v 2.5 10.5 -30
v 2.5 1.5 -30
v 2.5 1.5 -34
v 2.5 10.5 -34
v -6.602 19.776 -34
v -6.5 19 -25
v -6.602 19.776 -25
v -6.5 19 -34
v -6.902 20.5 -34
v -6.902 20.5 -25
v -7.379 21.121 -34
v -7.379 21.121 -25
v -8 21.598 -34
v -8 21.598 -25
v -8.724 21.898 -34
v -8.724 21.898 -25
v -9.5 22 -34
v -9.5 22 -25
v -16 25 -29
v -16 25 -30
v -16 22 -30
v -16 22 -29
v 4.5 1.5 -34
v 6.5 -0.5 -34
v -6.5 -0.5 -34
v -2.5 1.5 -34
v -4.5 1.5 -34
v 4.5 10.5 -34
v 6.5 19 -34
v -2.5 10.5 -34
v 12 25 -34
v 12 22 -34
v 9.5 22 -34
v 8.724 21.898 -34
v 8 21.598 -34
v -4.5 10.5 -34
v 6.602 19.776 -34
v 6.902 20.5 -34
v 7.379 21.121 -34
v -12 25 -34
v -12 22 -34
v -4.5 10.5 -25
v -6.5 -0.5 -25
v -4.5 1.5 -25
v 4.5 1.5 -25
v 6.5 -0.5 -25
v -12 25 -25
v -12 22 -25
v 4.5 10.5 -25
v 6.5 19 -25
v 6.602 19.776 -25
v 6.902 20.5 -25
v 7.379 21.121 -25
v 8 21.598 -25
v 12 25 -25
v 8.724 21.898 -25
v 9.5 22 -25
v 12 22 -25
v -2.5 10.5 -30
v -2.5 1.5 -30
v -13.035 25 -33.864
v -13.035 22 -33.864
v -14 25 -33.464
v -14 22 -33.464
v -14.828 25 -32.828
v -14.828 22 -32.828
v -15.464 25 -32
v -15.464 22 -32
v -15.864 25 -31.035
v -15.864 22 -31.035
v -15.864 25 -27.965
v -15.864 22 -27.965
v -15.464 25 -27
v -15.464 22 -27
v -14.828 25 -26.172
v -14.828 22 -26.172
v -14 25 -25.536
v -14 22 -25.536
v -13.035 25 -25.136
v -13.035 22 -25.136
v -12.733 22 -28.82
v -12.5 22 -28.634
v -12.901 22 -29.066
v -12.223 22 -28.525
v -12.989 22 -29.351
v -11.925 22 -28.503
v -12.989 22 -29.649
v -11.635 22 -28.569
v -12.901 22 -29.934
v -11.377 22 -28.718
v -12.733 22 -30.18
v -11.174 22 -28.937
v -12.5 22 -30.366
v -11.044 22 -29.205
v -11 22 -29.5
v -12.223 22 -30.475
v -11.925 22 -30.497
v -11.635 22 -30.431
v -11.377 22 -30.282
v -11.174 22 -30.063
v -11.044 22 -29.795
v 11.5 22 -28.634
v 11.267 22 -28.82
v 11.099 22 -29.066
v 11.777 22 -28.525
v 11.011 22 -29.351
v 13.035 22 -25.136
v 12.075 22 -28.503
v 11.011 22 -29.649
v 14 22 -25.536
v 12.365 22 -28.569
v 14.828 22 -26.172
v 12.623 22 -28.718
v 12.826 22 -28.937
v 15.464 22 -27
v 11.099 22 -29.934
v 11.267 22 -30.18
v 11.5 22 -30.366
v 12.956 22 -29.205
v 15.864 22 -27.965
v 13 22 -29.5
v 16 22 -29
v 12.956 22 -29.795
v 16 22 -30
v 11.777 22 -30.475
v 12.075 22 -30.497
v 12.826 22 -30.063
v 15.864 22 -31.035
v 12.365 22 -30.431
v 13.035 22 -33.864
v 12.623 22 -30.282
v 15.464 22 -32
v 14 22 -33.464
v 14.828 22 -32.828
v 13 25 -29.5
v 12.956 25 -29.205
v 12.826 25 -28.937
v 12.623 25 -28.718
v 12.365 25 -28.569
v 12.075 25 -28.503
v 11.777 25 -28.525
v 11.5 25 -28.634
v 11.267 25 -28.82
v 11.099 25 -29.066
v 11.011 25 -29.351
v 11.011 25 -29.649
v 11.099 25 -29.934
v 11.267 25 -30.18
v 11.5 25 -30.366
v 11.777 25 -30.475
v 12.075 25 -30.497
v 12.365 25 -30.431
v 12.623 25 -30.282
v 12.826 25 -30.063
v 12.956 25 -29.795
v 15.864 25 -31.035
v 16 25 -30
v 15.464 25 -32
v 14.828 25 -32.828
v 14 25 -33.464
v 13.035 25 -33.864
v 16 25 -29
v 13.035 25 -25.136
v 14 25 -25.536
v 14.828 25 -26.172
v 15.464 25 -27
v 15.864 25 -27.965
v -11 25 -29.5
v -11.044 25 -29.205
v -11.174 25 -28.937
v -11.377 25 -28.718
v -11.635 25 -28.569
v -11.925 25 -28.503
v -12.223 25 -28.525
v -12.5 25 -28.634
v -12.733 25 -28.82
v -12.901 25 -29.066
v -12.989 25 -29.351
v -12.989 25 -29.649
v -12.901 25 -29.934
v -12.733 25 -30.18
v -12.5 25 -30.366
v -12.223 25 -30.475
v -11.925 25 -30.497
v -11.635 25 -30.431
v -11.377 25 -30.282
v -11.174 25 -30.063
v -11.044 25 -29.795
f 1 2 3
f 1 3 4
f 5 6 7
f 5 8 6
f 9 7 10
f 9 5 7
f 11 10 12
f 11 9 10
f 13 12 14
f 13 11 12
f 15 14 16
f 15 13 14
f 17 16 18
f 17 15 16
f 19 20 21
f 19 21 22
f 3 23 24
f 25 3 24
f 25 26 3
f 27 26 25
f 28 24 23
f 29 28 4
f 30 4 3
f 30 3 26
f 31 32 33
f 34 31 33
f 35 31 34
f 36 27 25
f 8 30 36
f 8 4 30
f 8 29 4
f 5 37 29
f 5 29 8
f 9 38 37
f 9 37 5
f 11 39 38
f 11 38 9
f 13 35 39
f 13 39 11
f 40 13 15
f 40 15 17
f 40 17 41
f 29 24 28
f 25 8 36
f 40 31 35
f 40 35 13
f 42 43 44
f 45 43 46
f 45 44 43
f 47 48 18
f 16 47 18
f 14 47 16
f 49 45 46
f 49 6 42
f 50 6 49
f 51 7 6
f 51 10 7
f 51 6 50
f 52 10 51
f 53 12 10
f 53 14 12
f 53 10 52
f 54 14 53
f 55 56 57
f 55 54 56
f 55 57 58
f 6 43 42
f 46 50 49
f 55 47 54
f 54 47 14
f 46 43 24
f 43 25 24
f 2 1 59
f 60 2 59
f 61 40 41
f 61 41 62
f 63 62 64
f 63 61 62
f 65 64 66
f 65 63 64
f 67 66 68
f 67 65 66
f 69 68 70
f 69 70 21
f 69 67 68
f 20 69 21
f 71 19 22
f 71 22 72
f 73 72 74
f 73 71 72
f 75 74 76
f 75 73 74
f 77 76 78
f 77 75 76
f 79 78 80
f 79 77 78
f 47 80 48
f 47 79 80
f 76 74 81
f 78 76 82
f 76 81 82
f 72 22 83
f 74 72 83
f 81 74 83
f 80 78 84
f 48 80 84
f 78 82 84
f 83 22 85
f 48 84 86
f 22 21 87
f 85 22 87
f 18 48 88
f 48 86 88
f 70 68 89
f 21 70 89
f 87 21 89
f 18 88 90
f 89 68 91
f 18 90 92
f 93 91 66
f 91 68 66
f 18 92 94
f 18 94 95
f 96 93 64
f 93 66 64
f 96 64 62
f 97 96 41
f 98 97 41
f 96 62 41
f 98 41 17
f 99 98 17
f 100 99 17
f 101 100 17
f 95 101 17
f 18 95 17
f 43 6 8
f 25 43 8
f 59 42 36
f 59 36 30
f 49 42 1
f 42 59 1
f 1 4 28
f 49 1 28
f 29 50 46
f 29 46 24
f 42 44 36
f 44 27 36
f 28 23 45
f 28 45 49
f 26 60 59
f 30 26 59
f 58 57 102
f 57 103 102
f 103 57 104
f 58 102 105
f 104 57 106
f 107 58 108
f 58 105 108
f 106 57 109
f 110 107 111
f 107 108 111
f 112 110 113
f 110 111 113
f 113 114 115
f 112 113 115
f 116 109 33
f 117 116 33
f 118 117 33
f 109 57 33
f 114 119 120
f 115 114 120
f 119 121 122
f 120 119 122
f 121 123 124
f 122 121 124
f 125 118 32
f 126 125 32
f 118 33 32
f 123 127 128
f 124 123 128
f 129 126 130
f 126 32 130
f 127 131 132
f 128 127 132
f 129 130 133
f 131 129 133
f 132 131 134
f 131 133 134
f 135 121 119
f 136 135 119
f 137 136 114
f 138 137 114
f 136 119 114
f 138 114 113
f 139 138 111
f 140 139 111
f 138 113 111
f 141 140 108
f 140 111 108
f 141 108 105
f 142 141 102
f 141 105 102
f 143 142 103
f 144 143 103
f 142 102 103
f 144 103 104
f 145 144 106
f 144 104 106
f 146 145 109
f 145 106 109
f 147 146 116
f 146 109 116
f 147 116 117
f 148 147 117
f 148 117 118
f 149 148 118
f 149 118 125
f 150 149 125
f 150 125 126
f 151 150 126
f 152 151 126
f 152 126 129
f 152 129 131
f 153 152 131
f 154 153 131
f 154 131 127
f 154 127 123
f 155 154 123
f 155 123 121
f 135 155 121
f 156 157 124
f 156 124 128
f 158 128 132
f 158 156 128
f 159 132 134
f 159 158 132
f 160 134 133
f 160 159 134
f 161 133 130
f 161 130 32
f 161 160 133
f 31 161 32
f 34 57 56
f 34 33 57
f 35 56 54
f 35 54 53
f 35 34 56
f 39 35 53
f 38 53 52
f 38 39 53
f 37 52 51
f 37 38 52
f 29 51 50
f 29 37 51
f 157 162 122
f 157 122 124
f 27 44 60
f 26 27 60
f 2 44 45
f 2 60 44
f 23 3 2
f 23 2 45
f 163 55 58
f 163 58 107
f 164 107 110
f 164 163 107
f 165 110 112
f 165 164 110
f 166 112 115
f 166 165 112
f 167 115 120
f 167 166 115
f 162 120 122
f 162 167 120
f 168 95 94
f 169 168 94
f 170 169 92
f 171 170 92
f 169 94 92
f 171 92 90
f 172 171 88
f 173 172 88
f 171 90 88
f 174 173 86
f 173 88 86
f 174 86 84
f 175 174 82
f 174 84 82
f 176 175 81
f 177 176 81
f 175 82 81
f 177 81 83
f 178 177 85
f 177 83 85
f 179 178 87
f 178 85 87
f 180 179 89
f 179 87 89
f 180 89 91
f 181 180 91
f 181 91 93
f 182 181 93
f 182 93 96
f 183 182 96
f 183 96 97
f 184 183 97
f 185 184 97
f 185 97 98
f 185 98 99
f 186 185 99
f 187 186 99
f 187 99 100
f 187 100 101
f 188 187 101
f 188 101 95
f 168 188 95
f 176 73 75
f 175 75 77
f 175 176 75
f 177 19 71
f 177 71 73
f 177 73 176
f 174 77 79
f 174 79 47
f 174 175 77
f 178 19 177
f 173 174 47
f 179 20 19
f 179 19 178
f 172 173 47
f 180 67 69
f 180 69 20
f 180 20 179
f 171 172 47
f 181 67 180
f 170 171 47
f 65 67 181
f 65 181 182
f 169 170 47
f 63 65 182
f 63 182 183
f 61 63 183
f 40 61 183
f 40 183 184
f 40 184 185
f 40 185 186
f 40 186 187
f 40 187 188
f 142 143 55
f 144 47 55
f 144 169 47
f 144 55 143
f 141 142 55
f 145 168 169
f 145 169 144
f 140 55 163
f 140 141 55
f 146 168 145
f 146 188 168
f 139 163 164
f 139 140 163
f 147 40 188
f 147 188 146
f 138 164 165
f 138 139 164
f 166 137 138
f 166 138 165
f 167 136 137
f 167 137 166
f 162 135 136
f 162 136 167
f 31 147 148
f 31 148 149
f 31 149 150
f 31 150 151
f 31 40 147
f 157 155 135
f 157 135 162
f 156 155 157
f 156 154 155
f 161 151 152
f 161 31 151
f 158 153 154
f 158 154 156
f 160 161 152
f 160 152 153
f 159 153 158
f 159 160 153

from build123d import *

# Parameters (mm, degrees)
SKETCH1_W           = 13
SKETCH1_H           = 13
SKETCH1_W_2         = 5
SKETCH1_H_2         = 9
BOSS_EXTRUDE1_DEPTH = 4
SKETCH2_W           = 13
SKETCH2_H           = 13
SKETCH2_W_2         = 9
SKETCH2_H_2         = 9
BOSS_EXTRUDE2_DEPTH = 5
SKETCH3_W           = 13
SKETCH3_H           = 9
BOSS_EXTRUDE3_DEPTH = 12.5
BOSS_EXTRUDE4_DEPTH = 3
FILLET1_R           = 3
SKETCH5_R           = 1
CUT_EXTRUDE1_DEPTH  = 44.797830997


with BuildPart() as part:
    # Sketch1 → Boss-Extrude1 (new body)
    # profile 1 of 2: a face of its own
    with BuildSketch(Plane(origin=(0, 0, -30), x_dir=(-1, 0, 0), z_dir=(0, 0, -1))):
        with Locations((0, 6)):
            Rectangle(SKETCH1_W, SKETCH1_H)
        Polygon((-4.5, 10.5), (-2.5, 10.5), (2.5, 10.5), (4.5, 10.5), (4.5, 1.5), (2.5, 1.5), (-2.5, 1.5), (-4.5, 1.5), align=None, mode=Mode.SUBTRACT)
    # profile 2 of 2: a face of its own
    with BuildSketch(Plane(origin=(0, 0, -30), x_dir=(-1, 0, 0), z_dir=(0, 0, -1))):
        with Locations((0, 6)):
            Rectangle(SKETCH1_W_2, SKETCH1_H_2)
    extrude(amount=BOSS_EXTRUDE1_DEPTH)

    # Sketch2 → Boss-Extrude2 (add)
    with BuildSketch(Plane.XY.offset(-30)):
        with Locations((0, 6)):
            Rectangle(SKETCH2_W, SKETCH2_H)
        with Locations((0, 6)):
            Rectangle(SKETCH2_W_2, SKETCH2_H_2, mode=Mode.SUBTRACT)
    extrude(amount=BOSS_EXTRUDE2_DEPTH)

    # Sketch3 → Boss-Extrude3 (add)
    with BuildSketch(Plane(origin=(0, 12.5, 0), x_dir=(1, 0, 0), z_dir=(0, 1, 0))):
        with Locations((0, 29.5)):
            Rectangle(SKETCH3_W, SKETCH3_H)
    extrude(amount=BOSS_EXTRUDE3_DEPTH)

    # Sketch4 → Boss-Extrude4 (add)
    with BuildSketch(Plane(origin=(0, 25, 0), x_dir=(1, 0, 0), z_dir=(0, 1, 0))):
        with BuildLine():
            Line((-12, 25), (12, 25))
            ThreePointArc((12, 25), (14.828427125, 26.171572875), (16, 29))
            Line((16, 29), (16, 30))
            ThreePointArc((16, 30), (14.828427125, 32.828427125), (12, 34))
            Line((12, 34), (-12, 34))
            ThreePointArc((-12, 34), (-14.828427125, 32.828427125), (-16, 30))
            Line((-16, 30), (-16, 29))
            ThreePointArc((-16, 29), (-14.828427125, 26.171572875), (-12, 25))
        make_face()
    extrude(amount=-BOSS_EXTRUDE4_DEPTH)

    # Fillet1
    fillet1_edges = [part.edges().sort_by_distance(p)[0] for p in [
        (-6.5, 22, -29.5),
        (6.5, 22, -29.5),
    ]]
    fillet(fillet1_edges, radius=FILLET1_R)

    # Sketch5 → Cut-Extrude1 (cut, through all)
    with BuildSketch(Plane.XZ.offset(-22)):
        with Locations((-12, -29.5)):
            Circle(SKETCH5_R)
        with Locations((12, -29.5)):
            Circle(SKETCH5_R)
    extrude(amount=-CUT_EXTRUDE1_DEPTH, mode=Mode.SUBTRACT)


solid = part.part
